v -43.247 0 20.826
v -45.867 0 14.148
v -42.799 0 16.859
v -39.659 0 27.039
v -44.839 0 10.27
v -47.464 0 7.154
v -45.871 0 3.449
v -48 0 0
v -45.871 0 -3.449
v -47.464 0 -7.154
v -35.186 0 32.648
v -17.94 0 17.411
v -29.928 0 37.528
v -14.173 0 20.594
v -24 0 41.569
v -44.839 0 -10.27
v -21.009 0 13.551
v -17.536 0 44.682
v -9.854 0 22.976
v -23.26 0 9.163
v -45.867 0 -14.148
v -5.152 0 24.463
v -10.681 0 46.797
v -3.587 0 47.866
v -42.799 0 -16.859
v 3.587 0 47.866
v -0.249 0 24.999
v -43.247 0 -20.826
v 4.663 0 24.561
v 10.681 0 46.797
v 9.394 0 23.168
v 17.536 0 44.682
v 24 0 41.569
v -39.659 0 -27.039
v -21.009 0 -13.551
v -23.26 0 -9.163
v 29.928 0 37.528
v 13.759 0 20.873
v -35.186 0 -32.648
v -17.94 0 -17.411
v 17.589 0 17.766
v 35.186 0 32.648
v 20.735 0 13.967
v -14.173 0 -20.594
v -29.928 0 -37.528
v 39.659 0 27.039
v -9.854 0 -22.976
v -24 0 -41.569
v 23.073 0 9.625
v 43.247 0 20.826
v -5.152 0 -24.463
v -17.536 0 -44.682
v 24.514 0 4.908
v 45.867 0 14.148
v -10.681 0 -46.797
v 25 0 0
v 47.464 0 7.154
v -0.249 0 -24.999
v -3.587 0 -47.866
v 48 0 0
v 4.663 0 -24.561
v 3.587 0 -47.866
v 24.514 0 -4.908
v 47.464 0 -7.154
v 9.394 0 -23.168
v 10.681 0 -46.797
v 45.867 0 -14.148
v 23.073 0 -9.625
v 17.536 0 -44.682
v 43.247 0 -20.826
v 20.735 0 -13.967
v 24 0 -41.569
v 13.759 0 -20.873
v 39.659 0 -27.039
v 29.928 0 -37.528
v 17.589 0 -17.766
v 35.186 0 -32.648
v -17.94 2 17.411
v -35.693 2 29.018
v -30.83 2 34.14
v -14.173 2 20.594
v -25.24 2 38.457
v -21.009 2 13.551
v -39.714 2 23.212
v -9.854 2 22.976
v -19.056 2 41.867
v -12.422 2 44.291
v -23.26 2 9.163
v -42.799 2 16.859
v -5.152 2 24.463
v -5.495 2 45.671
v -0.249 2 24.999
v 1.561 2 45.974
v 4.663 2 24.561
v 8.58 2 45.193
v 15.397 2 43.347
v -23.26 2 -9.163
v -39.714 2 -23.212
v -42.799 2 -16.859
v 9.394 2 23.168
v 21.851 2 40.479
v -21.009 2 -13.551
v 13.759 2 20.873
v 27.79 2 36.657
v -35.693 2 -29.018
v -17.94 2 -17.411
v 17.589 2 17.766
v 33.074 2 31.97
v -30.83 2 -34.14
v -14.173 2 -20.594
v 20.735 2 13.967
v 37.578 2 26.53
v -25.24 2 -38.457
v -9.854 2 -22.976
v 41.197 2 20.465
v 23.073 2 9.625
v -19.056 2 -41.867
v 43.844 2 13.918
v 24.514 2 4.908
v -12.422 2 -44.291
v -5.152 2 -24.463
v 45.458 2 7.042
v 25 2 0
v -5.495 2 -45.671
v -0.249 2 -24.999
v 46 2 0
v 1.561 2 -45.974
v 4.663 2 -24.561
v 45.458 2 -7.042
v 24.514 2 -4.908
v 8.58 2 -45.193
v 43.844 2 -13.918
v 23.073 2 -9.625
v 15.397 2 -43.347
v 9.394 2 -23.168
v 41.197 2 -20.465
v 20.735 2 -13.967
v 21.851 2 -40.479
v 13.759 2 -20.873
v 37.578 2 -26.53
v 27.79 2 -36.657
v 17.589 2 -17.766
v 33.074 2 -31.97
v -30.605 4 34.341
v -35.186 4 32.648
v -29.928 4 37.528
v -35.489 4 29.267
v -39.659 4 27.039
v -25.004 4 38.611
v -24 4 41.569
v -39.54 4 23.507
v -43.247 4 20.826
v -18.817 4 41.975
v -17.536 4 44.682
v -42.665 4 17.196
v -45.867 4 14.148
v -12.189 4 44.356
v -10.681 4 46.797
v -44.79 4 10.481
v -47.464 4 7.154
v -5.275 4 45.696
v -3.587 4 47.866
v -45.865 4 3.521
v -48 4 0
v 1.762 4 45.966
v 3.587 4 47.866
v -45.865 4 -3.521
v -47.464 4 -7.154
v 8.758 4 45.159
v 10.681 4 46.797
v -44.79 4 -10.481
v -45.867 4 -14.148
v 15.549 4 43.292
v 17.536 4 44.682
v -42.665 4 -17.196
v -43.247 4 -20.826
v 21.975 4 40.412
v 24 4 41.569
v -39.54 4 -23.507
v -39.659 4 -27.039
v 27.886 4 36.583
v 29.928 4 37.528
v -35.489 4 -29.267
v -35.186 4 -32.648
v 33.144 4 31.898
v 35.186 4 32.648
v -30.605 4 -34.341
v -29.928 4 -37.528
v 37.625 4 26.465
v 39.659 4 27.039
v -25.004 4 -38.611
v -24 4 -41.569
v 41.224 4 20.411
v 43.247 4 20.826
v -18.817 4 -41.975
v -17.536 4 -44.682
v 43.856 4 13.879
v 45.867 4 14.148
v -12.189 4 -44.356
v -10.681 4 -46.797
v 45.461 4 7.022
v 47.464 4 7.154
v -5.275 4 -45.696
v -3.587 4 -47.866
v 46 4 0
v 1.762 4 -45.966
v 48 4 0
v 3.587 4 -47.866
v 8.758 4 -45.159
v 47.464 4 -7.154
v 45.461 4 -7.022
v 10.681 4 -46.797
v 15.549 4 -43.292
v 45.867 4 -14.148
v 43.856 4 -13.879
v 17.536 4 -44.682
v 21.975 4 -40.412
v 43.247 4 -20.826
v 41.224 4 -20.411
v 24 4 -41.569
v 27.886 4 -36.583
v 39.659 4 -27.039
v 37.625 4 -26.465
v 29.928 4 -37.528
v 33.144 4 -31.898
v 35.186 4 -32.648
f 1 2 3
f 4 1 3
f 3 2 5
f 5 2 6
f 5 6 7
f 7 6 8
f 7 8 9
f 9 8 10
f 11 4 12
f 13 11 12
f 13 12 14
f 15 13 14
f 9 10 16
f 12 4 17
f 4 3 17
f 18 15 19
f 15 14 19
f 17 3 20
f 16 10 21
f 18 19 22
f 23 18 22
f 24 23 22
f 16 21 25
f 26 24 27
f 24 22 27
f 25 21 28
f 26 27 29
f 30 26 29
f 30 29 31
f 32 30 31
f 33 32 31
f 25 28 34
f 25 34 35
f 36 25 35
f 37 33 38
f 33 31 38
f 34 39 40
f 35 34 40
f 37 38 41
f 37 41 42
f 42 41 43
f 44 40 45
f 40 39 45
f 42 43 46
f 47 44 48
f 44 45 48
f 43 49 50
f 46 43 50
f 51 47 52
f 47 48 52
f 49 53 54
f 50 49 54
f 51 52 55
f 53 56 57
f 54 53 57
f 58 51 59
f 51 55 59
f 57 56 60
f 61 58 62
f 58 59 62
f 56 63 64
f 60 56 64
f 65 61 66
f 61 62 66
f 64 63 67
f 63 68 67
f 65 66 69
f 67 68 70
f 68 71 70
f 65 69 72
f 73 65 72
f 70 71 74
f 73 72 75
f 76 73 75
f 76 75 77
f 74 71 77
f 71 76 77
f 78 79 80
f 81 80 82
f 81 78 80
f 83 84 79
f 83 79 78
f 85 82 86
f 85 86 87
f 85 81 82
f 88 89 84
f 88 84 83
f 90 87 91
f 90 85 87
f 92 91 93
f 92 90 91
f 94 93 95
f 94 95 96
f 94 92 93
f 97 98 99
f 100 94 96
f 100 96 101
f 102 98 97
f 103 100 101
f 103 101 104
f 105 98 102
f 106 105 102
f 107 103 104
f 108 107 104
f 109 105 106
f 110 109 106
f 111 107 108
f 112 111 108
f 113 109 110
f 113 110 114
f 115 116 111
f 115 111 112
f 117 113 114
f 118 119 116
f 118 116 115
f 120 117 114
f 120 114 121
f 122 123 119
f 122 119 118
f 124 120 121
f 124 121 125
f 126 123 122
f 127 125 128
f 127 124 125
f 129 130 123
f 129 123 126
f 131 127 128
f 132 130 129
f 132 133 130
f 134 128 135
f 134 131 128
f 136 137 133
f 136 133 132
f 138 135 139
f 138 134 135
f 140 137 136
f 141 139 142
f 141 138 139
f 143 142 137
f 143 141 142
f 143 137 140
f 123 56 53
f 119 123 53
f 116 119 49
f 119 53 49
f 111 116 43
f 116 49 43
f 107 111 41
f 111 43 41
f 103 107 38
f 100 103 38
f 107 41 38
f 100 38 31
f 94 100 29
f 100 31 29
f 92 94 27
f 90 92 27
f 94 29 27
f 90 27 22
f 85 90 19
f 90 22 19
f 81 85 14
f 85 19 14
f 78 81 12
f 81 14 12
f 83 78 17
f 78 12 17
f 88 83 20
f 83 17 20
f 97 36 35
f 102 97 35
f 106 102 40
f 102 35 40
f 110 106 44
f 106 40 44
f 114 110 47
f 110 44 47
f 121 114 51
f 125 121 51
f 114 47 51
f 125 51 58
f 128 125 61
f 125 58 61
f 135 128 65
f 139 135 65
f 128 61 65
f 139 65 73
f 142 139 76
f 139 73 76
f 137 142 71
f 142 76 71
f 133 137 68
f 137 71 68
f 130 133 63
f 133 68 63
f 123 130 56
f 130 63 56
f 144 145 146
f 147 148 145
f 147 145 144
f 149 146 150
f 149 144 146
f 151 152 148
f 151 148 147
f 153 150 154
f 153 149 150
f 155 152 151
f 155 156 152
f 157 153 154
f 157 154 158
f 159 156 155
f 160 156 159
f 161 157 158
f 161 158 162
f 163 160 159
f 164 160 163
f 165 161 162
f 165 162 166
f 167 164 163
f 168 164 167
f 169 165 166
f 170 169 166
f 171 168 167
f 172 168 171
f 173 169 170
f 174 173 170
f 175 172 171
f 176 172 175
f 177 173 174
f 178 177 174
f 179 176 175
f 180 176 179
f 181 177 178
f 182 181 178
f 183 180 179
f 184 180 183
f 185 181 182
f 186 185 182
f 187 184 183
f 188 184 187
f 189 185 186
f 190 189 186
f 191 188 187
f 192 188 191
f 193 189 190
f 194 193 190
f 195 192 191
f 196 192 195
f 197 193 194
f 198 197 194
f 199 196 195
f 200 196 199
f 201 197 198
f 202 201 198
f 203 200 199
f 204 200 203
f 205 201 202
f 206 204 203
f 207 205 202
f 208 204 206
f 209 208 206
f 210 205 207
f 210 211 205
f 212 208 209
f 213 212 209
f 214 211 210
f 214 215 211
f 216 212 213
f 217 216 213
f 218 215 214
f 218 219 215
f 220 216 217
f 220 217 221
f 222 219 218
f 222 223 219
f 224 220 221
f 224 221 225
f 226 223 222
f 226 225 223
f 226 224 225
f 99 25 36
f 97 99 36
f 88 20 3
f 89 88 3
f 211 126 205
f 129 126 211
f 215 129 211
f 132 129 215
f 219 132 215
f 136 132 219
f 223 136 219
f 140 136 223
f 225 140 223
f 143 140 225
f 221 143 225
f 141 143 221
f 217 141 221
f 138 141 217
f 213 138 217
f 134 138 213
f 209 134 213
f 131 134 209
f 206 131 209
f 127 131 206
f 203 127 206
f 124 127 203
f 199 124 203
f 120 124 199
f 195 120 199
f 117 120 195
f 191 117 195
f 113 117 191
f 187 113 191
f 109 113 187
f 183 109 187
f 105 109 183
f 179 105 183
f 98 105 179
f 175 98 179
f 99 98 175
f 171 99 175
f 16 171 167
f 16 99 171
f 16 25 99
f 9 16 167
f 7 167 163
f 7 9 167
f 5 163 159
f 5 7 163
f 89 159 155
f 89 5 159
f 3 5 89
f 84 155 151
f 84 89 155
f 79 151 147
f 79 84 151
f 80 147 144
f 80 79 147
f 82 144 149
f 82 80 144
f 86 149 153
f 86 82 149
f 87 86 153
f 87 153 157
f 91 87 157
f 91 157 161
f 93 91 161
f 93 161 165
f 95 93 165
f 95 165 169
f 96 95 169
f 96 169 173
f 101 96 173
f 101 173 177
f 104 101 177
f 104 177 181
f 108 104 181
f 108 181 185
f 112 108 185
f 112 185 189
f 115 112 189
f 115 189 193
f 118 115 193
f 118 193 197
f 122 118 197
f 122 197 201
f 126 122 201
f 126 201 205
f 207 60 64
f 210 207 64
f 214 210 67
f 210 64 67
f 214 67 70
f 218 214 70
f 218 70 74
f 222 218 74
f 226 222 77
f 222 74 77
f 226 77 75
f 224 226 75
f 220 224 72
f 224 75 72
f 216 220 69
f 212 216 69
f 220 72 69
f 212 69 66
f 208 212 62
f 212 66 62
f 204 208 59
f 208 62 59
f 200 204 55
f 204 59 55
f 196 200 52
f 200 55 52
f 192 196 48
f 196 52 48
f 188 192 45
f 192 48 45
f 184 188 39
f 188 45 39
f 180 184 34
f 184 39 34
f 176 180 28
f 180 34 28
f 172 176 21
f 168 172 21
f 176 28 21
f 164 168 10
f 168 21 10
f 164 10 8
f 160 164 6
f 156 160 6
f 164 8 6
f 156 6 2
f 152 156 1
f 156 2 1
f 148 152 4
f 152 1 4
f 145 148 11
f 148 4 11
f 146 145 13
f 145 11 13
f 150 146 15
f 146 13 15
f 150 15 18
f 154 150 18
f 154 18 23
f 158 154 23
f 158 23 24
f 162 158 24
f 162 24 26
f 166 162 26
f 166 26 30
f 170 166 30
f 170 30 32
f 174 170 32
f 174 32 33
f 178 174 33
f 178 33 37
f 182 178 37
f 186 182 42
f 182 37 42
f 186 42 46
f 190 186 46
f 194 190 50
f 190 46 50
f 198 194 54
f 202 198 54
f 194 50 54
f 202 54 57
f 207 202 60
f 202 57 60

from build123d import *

# Parameters (mm, degrees)
SKETCH1_R           = 48
BOSS_EXTRUDE1_DEPTH = 4
BOSS_EXTRUDE2_DEPTH = 2


with BuildPart() as part:
    # Sketch1 → Boss-Extrude1 (new body)
    with BuildSketch(Plane(origin=(0, 0, 0), x_dir=(1, 0, 0), z_dir=(0, 1, 0))):
        Circle(SKETCH1_R)
        with BuildLine():
            ThreePointArc((46, 0), (8.580105656, -45.192718295), (-42.799208127, -16.859056429))
            ThreePointArc((-42.799208127, -16.859056429), (-46, 0), (-42.799208127, 16.859056429))
            ThreePointArc((-42.799208127, 16.859056429), (8.580105656, 45.192718295), (46, 0))
        make_face(mode=Mode.SUBTRACT)
    extrude(amount=BOSS_EXTRUDE1_DEPTH)

    # Sketch1<3> → Boss-Extrude2 (add)
    with BuildSketch(Plane(origin=(0, 0, 0), x_dir=(1, 0, 0), z_dir=(0, 1, 0))):
        with BuildLine():
            ThreePointArc((25, 0), (4.6631009, -24.561259943), (-23.2604392, -9.162530668))
            Line((-23.2604392, -9.162530668), (-42.799208127, -16.859056429))
            ThreePointArc((-42.799208127, -16.859056429), (8.580105656, -45.192718295), (46, 0))
            ThreePointArc((46, 0), (8.580105656, 45.192718295), (-42.799208127, 16.859056429))
            Line((-42.799208127, 16.859056429), (-23.2604392, 9.162530668))
            ThreePointArc((-23.2604392, 9.162530668), (4.6631009, 24.561259943), (25, 0))
        make_face()
    extrude(amount=BOSS_EXTRUDE2_DEPTH)


solid = part.part
